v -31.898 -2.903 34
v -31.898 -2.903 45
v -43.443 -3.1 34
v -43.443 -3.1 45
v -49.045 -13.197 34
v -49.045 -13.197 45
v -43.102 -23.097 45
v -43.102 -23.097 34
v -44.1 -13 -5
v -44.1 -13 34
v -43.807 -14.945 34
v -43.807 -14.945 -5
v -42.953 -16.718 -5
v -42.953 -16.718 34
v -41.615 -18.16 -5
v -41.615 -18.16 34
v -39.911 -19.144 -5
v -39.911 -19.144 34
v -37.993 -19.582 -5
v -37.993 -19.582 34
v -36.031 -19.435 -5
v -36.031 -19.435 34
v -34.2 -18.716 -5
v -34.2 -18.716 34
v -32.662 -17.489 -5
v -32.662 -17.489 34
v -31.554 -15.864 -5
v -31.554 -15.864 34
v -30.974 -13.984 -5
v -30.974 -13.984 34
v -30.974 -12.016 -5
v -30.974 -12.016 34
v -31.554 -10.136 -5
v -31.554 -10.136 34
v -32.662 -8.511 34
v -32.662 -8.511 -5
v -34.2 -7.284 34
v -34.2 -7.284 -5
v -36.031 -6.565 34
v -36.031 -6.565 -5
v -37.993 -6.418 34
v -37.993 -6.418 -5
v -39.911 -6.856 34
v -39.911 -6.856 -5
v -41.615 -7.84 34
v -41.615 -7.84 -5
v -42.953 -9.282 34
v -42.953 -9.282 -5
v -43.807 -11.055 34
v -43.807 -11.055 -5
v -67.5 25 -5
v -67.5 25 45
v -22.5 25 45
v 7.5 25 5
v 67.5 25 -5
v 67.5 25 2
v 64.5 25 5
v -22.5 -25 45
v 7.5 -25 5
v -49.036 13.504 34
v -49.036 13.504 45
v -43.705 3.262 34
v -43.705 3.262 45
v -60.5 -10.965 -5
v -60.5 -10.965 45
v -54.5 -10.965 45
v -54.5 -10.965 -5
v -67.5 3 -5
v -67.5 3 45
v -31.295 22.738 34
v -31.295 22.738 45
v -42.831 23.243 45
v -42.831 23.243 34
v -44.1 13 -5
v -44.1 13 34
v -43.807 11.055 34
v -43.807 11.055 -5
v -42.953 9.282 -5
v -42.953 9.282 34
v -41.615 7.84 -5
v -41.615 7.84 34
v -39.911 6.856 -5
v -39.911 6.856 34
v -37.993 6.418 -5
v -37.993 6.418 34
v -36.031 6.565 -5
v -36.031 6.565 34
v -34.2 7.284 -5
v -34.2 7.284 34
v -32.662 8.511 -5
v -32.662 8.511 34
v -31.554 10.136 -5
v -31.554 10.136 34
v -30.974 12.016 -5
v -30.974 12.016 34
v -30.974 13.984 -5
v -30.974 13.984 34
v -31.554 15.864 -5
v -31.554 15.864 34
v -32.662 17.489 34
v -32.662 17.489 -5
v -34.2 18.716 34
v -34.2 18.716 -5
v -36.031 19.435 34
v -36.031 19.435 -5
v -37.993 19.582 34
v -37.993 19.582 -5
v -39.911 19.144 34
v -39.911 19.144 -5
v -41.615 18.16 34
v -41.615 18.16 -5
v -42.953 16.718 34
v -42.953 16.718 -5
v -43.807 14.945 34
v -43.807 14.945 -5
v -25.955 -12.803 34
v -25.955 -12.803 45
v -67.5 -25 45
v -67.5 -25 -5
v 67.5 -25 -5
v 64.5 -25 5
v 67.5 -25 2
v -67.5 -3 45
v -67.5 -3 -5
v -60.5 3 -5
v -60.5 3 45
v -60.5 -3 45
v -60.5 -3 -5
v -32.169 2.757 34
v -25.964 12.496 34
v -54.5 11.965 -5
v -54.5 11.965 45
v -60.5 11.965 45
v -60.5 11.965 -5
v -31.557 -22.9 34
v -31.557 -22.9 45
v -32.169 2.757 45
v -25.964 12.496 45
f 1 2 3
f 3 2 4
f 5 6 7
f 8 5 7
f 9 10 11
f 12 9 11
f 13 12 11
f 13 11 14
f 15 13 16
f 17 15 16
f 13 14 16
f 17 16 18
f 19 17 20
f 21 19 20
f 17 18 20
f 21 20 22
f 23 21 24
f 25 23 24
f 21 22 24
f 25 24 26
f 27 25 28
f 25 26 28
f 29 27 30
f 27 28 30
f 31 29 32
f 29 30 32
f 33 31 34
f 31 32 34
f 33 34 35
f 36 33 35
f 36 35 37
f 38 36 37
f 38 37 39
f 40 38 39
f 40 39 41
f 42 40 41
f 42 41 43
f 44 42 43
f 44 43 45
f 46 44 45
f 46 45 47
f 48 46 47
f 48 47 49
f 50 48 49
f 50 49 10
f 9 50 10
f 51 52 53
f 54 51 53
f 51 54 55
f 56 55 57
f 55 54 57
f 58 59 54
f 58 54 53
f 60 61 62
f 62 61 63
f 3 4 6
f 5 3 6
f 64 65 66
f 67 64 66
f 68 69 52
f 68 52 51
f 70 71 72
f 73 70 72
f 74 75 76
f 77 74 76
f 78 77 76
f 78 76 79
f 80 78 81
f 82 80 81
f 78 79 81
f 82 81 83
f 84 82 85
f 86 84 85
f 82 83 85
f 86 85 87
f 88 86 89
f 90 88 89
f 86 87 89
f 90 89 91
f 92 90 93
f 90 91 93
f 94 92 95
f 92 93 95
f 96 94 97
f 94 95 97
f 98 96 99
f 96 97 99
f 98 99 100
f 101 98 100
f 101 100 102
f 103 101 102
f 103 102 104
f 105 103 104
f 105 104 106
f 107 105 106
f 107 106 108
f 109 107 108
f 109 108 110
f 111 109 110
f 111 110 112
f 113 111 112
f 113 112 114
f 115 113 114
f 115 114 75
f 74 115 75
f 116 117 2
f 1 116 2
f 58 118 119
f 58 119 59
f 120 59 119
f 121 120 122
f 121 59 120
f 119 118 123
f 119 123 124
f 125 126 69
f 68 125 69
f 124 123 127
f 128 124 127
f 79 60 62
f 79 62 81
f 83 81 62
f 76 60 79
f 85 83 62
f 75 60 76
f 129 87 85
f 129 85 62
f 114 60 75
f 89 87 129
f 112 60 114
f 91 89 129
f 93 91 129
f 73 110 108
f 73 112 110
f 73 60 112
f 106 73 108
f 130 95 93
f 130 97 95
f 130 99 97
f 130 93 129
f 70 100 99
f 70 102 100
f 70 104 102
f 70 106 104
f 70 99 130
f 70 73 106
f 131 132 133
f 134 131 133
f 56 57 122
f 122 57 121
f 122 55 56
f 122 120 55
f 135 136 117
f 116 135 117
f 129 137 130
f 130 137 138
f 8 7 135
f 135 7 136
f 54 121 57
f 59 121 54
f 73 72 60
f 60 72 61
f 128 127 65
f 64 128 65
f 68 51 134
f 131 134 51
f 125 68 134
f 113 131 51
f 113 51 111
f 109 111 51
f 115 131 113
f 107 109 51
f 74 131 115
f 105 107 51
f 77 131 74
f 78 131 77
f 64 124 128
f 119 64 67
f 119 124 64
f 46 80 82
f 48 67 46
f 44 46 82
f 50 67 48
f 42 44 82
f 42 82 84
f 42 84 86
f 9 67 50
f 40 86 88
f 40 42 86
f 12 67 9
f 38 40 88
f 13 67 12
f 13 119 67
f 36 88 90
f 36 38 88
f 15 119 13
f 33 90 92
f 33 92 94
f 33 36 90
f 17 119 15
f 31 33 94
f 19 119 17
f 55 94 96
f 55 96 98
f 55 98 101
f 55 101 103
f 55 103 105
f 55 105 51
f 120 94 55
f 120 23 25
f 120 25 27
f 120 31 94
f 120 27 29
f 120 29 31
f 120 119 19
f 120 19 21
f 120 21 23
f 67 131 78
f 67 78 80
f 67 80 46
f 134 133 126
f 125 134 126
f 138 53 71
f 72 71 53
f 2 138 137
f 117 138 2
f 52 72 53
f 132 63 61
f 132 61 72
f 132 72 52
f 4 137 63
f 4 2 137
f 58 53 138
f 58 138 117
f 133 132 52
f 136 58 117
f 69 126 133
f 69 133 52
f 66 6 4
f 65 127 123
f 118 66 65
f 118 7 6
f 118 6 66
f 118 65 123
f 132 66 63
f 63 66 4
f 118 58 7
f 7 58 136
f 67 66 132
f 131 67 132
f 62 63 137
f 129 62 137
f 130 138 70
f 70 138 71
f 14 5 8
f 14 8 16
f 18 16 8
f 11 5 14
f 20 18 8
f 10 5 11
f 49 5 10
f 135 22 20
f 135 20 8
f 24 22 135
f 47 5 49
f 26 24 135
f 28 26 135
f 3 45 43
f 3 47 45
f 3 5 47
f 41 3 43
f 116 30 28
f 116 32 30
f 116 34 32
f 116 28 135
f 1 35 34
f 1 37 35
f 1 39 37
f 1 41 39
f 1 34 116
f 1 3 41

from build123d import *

# Parameters (mm, degrees)
F1_DEPTH       = 25
F2_DEPTH       = 25
F4_D           = 13.2
F4_CBORE_D     = 23
F4_CBORE_DEPTH = 0
F6_DEPTH       = 50.001
F8_DEPTH       = 11
F9_SIZE        = 3


# Not quite as in the source:
# - a feature names something its author has since deleted; it is built from what else it names


with BuildPart() as f1:
    # F0 (on Front) → F1 (new body, symmetric)
    with BuildSketch(Plane.XZ):
        Polygon((67.5, -5), (67.5, 5), (7.5, 5), (-67.5, 5), (-67.5, -5), align=None)
    extrude(amount=F1_DEPTH, both=True)

    # F0 (on Front) → F2 (join, symmetric)
    with BuildSketch(Plane.XZ):
        Polygon((-67.5, 5), (7.5, 5), (-22.5, 45), (-67.5, 45), align=None)
    extrude(amount=F2_DEPTH, both=True)

    # F4 (through all)
    with Locations(Plane(origin=(0, 0, -5), x_dir=(1, 0, 0), z_dir=(0, 0, -1))):
        with Locations((-37.5, 13), (-37.5, -13)):
            CounterBoreHole(F4_D / 2, F4_CBORE_D / 2, F4_CBORE_DEPTH)

    # F5 (on face) → F6 (cut, through all)
    with BuildSketch(Plane.XY.offset(45)):
        Polygon((-60.5, 3), (-67.5, 3), (-67.5, -3), (-60.5, -3), (-60.5, -10.9647801146), (-54.5, -10.9647801146), (-54.5, 11.965367943), (-60.5, 11.965367943), align=None)
    extrude(amount=-F6_DEPTH, mode=Mode.SUBTRACT)

    # F7 (on face) → F8 (cut)
    with BuildSketch(Plane.XY.offset(45)):
        Polygon((-25.954678559, -12.8028042668), (-31.898115794, -2.9028604706), (-43.443437235, -3.1000562039), (-49.045321441, -13.1971957332), (-43.101884206, -23.0971395294), (-31.556562765, -22.8999437961), align=None)
        Polygon((-25.9640170016, 12.4955898546), (-31.2951765009, 22.7382492615), (-42.8311594993, 23.2426594069), (-49.0359829984, 13.5044101454), (-43.7048234991, 3.2617507385), (-32.1688405007, 2.7573405931), align=None)
    extrude(amount=-F8_DEPTH, mode=Mode.SUBTRACT)

    # F9
    f9_edges = [f1.edges().sort_by_distance(p)[0] for p in [
        (67.5, 0, 5),
    ]]
    chamfer(f9_edges, length=F9_SIZE)


solid = f1.part
